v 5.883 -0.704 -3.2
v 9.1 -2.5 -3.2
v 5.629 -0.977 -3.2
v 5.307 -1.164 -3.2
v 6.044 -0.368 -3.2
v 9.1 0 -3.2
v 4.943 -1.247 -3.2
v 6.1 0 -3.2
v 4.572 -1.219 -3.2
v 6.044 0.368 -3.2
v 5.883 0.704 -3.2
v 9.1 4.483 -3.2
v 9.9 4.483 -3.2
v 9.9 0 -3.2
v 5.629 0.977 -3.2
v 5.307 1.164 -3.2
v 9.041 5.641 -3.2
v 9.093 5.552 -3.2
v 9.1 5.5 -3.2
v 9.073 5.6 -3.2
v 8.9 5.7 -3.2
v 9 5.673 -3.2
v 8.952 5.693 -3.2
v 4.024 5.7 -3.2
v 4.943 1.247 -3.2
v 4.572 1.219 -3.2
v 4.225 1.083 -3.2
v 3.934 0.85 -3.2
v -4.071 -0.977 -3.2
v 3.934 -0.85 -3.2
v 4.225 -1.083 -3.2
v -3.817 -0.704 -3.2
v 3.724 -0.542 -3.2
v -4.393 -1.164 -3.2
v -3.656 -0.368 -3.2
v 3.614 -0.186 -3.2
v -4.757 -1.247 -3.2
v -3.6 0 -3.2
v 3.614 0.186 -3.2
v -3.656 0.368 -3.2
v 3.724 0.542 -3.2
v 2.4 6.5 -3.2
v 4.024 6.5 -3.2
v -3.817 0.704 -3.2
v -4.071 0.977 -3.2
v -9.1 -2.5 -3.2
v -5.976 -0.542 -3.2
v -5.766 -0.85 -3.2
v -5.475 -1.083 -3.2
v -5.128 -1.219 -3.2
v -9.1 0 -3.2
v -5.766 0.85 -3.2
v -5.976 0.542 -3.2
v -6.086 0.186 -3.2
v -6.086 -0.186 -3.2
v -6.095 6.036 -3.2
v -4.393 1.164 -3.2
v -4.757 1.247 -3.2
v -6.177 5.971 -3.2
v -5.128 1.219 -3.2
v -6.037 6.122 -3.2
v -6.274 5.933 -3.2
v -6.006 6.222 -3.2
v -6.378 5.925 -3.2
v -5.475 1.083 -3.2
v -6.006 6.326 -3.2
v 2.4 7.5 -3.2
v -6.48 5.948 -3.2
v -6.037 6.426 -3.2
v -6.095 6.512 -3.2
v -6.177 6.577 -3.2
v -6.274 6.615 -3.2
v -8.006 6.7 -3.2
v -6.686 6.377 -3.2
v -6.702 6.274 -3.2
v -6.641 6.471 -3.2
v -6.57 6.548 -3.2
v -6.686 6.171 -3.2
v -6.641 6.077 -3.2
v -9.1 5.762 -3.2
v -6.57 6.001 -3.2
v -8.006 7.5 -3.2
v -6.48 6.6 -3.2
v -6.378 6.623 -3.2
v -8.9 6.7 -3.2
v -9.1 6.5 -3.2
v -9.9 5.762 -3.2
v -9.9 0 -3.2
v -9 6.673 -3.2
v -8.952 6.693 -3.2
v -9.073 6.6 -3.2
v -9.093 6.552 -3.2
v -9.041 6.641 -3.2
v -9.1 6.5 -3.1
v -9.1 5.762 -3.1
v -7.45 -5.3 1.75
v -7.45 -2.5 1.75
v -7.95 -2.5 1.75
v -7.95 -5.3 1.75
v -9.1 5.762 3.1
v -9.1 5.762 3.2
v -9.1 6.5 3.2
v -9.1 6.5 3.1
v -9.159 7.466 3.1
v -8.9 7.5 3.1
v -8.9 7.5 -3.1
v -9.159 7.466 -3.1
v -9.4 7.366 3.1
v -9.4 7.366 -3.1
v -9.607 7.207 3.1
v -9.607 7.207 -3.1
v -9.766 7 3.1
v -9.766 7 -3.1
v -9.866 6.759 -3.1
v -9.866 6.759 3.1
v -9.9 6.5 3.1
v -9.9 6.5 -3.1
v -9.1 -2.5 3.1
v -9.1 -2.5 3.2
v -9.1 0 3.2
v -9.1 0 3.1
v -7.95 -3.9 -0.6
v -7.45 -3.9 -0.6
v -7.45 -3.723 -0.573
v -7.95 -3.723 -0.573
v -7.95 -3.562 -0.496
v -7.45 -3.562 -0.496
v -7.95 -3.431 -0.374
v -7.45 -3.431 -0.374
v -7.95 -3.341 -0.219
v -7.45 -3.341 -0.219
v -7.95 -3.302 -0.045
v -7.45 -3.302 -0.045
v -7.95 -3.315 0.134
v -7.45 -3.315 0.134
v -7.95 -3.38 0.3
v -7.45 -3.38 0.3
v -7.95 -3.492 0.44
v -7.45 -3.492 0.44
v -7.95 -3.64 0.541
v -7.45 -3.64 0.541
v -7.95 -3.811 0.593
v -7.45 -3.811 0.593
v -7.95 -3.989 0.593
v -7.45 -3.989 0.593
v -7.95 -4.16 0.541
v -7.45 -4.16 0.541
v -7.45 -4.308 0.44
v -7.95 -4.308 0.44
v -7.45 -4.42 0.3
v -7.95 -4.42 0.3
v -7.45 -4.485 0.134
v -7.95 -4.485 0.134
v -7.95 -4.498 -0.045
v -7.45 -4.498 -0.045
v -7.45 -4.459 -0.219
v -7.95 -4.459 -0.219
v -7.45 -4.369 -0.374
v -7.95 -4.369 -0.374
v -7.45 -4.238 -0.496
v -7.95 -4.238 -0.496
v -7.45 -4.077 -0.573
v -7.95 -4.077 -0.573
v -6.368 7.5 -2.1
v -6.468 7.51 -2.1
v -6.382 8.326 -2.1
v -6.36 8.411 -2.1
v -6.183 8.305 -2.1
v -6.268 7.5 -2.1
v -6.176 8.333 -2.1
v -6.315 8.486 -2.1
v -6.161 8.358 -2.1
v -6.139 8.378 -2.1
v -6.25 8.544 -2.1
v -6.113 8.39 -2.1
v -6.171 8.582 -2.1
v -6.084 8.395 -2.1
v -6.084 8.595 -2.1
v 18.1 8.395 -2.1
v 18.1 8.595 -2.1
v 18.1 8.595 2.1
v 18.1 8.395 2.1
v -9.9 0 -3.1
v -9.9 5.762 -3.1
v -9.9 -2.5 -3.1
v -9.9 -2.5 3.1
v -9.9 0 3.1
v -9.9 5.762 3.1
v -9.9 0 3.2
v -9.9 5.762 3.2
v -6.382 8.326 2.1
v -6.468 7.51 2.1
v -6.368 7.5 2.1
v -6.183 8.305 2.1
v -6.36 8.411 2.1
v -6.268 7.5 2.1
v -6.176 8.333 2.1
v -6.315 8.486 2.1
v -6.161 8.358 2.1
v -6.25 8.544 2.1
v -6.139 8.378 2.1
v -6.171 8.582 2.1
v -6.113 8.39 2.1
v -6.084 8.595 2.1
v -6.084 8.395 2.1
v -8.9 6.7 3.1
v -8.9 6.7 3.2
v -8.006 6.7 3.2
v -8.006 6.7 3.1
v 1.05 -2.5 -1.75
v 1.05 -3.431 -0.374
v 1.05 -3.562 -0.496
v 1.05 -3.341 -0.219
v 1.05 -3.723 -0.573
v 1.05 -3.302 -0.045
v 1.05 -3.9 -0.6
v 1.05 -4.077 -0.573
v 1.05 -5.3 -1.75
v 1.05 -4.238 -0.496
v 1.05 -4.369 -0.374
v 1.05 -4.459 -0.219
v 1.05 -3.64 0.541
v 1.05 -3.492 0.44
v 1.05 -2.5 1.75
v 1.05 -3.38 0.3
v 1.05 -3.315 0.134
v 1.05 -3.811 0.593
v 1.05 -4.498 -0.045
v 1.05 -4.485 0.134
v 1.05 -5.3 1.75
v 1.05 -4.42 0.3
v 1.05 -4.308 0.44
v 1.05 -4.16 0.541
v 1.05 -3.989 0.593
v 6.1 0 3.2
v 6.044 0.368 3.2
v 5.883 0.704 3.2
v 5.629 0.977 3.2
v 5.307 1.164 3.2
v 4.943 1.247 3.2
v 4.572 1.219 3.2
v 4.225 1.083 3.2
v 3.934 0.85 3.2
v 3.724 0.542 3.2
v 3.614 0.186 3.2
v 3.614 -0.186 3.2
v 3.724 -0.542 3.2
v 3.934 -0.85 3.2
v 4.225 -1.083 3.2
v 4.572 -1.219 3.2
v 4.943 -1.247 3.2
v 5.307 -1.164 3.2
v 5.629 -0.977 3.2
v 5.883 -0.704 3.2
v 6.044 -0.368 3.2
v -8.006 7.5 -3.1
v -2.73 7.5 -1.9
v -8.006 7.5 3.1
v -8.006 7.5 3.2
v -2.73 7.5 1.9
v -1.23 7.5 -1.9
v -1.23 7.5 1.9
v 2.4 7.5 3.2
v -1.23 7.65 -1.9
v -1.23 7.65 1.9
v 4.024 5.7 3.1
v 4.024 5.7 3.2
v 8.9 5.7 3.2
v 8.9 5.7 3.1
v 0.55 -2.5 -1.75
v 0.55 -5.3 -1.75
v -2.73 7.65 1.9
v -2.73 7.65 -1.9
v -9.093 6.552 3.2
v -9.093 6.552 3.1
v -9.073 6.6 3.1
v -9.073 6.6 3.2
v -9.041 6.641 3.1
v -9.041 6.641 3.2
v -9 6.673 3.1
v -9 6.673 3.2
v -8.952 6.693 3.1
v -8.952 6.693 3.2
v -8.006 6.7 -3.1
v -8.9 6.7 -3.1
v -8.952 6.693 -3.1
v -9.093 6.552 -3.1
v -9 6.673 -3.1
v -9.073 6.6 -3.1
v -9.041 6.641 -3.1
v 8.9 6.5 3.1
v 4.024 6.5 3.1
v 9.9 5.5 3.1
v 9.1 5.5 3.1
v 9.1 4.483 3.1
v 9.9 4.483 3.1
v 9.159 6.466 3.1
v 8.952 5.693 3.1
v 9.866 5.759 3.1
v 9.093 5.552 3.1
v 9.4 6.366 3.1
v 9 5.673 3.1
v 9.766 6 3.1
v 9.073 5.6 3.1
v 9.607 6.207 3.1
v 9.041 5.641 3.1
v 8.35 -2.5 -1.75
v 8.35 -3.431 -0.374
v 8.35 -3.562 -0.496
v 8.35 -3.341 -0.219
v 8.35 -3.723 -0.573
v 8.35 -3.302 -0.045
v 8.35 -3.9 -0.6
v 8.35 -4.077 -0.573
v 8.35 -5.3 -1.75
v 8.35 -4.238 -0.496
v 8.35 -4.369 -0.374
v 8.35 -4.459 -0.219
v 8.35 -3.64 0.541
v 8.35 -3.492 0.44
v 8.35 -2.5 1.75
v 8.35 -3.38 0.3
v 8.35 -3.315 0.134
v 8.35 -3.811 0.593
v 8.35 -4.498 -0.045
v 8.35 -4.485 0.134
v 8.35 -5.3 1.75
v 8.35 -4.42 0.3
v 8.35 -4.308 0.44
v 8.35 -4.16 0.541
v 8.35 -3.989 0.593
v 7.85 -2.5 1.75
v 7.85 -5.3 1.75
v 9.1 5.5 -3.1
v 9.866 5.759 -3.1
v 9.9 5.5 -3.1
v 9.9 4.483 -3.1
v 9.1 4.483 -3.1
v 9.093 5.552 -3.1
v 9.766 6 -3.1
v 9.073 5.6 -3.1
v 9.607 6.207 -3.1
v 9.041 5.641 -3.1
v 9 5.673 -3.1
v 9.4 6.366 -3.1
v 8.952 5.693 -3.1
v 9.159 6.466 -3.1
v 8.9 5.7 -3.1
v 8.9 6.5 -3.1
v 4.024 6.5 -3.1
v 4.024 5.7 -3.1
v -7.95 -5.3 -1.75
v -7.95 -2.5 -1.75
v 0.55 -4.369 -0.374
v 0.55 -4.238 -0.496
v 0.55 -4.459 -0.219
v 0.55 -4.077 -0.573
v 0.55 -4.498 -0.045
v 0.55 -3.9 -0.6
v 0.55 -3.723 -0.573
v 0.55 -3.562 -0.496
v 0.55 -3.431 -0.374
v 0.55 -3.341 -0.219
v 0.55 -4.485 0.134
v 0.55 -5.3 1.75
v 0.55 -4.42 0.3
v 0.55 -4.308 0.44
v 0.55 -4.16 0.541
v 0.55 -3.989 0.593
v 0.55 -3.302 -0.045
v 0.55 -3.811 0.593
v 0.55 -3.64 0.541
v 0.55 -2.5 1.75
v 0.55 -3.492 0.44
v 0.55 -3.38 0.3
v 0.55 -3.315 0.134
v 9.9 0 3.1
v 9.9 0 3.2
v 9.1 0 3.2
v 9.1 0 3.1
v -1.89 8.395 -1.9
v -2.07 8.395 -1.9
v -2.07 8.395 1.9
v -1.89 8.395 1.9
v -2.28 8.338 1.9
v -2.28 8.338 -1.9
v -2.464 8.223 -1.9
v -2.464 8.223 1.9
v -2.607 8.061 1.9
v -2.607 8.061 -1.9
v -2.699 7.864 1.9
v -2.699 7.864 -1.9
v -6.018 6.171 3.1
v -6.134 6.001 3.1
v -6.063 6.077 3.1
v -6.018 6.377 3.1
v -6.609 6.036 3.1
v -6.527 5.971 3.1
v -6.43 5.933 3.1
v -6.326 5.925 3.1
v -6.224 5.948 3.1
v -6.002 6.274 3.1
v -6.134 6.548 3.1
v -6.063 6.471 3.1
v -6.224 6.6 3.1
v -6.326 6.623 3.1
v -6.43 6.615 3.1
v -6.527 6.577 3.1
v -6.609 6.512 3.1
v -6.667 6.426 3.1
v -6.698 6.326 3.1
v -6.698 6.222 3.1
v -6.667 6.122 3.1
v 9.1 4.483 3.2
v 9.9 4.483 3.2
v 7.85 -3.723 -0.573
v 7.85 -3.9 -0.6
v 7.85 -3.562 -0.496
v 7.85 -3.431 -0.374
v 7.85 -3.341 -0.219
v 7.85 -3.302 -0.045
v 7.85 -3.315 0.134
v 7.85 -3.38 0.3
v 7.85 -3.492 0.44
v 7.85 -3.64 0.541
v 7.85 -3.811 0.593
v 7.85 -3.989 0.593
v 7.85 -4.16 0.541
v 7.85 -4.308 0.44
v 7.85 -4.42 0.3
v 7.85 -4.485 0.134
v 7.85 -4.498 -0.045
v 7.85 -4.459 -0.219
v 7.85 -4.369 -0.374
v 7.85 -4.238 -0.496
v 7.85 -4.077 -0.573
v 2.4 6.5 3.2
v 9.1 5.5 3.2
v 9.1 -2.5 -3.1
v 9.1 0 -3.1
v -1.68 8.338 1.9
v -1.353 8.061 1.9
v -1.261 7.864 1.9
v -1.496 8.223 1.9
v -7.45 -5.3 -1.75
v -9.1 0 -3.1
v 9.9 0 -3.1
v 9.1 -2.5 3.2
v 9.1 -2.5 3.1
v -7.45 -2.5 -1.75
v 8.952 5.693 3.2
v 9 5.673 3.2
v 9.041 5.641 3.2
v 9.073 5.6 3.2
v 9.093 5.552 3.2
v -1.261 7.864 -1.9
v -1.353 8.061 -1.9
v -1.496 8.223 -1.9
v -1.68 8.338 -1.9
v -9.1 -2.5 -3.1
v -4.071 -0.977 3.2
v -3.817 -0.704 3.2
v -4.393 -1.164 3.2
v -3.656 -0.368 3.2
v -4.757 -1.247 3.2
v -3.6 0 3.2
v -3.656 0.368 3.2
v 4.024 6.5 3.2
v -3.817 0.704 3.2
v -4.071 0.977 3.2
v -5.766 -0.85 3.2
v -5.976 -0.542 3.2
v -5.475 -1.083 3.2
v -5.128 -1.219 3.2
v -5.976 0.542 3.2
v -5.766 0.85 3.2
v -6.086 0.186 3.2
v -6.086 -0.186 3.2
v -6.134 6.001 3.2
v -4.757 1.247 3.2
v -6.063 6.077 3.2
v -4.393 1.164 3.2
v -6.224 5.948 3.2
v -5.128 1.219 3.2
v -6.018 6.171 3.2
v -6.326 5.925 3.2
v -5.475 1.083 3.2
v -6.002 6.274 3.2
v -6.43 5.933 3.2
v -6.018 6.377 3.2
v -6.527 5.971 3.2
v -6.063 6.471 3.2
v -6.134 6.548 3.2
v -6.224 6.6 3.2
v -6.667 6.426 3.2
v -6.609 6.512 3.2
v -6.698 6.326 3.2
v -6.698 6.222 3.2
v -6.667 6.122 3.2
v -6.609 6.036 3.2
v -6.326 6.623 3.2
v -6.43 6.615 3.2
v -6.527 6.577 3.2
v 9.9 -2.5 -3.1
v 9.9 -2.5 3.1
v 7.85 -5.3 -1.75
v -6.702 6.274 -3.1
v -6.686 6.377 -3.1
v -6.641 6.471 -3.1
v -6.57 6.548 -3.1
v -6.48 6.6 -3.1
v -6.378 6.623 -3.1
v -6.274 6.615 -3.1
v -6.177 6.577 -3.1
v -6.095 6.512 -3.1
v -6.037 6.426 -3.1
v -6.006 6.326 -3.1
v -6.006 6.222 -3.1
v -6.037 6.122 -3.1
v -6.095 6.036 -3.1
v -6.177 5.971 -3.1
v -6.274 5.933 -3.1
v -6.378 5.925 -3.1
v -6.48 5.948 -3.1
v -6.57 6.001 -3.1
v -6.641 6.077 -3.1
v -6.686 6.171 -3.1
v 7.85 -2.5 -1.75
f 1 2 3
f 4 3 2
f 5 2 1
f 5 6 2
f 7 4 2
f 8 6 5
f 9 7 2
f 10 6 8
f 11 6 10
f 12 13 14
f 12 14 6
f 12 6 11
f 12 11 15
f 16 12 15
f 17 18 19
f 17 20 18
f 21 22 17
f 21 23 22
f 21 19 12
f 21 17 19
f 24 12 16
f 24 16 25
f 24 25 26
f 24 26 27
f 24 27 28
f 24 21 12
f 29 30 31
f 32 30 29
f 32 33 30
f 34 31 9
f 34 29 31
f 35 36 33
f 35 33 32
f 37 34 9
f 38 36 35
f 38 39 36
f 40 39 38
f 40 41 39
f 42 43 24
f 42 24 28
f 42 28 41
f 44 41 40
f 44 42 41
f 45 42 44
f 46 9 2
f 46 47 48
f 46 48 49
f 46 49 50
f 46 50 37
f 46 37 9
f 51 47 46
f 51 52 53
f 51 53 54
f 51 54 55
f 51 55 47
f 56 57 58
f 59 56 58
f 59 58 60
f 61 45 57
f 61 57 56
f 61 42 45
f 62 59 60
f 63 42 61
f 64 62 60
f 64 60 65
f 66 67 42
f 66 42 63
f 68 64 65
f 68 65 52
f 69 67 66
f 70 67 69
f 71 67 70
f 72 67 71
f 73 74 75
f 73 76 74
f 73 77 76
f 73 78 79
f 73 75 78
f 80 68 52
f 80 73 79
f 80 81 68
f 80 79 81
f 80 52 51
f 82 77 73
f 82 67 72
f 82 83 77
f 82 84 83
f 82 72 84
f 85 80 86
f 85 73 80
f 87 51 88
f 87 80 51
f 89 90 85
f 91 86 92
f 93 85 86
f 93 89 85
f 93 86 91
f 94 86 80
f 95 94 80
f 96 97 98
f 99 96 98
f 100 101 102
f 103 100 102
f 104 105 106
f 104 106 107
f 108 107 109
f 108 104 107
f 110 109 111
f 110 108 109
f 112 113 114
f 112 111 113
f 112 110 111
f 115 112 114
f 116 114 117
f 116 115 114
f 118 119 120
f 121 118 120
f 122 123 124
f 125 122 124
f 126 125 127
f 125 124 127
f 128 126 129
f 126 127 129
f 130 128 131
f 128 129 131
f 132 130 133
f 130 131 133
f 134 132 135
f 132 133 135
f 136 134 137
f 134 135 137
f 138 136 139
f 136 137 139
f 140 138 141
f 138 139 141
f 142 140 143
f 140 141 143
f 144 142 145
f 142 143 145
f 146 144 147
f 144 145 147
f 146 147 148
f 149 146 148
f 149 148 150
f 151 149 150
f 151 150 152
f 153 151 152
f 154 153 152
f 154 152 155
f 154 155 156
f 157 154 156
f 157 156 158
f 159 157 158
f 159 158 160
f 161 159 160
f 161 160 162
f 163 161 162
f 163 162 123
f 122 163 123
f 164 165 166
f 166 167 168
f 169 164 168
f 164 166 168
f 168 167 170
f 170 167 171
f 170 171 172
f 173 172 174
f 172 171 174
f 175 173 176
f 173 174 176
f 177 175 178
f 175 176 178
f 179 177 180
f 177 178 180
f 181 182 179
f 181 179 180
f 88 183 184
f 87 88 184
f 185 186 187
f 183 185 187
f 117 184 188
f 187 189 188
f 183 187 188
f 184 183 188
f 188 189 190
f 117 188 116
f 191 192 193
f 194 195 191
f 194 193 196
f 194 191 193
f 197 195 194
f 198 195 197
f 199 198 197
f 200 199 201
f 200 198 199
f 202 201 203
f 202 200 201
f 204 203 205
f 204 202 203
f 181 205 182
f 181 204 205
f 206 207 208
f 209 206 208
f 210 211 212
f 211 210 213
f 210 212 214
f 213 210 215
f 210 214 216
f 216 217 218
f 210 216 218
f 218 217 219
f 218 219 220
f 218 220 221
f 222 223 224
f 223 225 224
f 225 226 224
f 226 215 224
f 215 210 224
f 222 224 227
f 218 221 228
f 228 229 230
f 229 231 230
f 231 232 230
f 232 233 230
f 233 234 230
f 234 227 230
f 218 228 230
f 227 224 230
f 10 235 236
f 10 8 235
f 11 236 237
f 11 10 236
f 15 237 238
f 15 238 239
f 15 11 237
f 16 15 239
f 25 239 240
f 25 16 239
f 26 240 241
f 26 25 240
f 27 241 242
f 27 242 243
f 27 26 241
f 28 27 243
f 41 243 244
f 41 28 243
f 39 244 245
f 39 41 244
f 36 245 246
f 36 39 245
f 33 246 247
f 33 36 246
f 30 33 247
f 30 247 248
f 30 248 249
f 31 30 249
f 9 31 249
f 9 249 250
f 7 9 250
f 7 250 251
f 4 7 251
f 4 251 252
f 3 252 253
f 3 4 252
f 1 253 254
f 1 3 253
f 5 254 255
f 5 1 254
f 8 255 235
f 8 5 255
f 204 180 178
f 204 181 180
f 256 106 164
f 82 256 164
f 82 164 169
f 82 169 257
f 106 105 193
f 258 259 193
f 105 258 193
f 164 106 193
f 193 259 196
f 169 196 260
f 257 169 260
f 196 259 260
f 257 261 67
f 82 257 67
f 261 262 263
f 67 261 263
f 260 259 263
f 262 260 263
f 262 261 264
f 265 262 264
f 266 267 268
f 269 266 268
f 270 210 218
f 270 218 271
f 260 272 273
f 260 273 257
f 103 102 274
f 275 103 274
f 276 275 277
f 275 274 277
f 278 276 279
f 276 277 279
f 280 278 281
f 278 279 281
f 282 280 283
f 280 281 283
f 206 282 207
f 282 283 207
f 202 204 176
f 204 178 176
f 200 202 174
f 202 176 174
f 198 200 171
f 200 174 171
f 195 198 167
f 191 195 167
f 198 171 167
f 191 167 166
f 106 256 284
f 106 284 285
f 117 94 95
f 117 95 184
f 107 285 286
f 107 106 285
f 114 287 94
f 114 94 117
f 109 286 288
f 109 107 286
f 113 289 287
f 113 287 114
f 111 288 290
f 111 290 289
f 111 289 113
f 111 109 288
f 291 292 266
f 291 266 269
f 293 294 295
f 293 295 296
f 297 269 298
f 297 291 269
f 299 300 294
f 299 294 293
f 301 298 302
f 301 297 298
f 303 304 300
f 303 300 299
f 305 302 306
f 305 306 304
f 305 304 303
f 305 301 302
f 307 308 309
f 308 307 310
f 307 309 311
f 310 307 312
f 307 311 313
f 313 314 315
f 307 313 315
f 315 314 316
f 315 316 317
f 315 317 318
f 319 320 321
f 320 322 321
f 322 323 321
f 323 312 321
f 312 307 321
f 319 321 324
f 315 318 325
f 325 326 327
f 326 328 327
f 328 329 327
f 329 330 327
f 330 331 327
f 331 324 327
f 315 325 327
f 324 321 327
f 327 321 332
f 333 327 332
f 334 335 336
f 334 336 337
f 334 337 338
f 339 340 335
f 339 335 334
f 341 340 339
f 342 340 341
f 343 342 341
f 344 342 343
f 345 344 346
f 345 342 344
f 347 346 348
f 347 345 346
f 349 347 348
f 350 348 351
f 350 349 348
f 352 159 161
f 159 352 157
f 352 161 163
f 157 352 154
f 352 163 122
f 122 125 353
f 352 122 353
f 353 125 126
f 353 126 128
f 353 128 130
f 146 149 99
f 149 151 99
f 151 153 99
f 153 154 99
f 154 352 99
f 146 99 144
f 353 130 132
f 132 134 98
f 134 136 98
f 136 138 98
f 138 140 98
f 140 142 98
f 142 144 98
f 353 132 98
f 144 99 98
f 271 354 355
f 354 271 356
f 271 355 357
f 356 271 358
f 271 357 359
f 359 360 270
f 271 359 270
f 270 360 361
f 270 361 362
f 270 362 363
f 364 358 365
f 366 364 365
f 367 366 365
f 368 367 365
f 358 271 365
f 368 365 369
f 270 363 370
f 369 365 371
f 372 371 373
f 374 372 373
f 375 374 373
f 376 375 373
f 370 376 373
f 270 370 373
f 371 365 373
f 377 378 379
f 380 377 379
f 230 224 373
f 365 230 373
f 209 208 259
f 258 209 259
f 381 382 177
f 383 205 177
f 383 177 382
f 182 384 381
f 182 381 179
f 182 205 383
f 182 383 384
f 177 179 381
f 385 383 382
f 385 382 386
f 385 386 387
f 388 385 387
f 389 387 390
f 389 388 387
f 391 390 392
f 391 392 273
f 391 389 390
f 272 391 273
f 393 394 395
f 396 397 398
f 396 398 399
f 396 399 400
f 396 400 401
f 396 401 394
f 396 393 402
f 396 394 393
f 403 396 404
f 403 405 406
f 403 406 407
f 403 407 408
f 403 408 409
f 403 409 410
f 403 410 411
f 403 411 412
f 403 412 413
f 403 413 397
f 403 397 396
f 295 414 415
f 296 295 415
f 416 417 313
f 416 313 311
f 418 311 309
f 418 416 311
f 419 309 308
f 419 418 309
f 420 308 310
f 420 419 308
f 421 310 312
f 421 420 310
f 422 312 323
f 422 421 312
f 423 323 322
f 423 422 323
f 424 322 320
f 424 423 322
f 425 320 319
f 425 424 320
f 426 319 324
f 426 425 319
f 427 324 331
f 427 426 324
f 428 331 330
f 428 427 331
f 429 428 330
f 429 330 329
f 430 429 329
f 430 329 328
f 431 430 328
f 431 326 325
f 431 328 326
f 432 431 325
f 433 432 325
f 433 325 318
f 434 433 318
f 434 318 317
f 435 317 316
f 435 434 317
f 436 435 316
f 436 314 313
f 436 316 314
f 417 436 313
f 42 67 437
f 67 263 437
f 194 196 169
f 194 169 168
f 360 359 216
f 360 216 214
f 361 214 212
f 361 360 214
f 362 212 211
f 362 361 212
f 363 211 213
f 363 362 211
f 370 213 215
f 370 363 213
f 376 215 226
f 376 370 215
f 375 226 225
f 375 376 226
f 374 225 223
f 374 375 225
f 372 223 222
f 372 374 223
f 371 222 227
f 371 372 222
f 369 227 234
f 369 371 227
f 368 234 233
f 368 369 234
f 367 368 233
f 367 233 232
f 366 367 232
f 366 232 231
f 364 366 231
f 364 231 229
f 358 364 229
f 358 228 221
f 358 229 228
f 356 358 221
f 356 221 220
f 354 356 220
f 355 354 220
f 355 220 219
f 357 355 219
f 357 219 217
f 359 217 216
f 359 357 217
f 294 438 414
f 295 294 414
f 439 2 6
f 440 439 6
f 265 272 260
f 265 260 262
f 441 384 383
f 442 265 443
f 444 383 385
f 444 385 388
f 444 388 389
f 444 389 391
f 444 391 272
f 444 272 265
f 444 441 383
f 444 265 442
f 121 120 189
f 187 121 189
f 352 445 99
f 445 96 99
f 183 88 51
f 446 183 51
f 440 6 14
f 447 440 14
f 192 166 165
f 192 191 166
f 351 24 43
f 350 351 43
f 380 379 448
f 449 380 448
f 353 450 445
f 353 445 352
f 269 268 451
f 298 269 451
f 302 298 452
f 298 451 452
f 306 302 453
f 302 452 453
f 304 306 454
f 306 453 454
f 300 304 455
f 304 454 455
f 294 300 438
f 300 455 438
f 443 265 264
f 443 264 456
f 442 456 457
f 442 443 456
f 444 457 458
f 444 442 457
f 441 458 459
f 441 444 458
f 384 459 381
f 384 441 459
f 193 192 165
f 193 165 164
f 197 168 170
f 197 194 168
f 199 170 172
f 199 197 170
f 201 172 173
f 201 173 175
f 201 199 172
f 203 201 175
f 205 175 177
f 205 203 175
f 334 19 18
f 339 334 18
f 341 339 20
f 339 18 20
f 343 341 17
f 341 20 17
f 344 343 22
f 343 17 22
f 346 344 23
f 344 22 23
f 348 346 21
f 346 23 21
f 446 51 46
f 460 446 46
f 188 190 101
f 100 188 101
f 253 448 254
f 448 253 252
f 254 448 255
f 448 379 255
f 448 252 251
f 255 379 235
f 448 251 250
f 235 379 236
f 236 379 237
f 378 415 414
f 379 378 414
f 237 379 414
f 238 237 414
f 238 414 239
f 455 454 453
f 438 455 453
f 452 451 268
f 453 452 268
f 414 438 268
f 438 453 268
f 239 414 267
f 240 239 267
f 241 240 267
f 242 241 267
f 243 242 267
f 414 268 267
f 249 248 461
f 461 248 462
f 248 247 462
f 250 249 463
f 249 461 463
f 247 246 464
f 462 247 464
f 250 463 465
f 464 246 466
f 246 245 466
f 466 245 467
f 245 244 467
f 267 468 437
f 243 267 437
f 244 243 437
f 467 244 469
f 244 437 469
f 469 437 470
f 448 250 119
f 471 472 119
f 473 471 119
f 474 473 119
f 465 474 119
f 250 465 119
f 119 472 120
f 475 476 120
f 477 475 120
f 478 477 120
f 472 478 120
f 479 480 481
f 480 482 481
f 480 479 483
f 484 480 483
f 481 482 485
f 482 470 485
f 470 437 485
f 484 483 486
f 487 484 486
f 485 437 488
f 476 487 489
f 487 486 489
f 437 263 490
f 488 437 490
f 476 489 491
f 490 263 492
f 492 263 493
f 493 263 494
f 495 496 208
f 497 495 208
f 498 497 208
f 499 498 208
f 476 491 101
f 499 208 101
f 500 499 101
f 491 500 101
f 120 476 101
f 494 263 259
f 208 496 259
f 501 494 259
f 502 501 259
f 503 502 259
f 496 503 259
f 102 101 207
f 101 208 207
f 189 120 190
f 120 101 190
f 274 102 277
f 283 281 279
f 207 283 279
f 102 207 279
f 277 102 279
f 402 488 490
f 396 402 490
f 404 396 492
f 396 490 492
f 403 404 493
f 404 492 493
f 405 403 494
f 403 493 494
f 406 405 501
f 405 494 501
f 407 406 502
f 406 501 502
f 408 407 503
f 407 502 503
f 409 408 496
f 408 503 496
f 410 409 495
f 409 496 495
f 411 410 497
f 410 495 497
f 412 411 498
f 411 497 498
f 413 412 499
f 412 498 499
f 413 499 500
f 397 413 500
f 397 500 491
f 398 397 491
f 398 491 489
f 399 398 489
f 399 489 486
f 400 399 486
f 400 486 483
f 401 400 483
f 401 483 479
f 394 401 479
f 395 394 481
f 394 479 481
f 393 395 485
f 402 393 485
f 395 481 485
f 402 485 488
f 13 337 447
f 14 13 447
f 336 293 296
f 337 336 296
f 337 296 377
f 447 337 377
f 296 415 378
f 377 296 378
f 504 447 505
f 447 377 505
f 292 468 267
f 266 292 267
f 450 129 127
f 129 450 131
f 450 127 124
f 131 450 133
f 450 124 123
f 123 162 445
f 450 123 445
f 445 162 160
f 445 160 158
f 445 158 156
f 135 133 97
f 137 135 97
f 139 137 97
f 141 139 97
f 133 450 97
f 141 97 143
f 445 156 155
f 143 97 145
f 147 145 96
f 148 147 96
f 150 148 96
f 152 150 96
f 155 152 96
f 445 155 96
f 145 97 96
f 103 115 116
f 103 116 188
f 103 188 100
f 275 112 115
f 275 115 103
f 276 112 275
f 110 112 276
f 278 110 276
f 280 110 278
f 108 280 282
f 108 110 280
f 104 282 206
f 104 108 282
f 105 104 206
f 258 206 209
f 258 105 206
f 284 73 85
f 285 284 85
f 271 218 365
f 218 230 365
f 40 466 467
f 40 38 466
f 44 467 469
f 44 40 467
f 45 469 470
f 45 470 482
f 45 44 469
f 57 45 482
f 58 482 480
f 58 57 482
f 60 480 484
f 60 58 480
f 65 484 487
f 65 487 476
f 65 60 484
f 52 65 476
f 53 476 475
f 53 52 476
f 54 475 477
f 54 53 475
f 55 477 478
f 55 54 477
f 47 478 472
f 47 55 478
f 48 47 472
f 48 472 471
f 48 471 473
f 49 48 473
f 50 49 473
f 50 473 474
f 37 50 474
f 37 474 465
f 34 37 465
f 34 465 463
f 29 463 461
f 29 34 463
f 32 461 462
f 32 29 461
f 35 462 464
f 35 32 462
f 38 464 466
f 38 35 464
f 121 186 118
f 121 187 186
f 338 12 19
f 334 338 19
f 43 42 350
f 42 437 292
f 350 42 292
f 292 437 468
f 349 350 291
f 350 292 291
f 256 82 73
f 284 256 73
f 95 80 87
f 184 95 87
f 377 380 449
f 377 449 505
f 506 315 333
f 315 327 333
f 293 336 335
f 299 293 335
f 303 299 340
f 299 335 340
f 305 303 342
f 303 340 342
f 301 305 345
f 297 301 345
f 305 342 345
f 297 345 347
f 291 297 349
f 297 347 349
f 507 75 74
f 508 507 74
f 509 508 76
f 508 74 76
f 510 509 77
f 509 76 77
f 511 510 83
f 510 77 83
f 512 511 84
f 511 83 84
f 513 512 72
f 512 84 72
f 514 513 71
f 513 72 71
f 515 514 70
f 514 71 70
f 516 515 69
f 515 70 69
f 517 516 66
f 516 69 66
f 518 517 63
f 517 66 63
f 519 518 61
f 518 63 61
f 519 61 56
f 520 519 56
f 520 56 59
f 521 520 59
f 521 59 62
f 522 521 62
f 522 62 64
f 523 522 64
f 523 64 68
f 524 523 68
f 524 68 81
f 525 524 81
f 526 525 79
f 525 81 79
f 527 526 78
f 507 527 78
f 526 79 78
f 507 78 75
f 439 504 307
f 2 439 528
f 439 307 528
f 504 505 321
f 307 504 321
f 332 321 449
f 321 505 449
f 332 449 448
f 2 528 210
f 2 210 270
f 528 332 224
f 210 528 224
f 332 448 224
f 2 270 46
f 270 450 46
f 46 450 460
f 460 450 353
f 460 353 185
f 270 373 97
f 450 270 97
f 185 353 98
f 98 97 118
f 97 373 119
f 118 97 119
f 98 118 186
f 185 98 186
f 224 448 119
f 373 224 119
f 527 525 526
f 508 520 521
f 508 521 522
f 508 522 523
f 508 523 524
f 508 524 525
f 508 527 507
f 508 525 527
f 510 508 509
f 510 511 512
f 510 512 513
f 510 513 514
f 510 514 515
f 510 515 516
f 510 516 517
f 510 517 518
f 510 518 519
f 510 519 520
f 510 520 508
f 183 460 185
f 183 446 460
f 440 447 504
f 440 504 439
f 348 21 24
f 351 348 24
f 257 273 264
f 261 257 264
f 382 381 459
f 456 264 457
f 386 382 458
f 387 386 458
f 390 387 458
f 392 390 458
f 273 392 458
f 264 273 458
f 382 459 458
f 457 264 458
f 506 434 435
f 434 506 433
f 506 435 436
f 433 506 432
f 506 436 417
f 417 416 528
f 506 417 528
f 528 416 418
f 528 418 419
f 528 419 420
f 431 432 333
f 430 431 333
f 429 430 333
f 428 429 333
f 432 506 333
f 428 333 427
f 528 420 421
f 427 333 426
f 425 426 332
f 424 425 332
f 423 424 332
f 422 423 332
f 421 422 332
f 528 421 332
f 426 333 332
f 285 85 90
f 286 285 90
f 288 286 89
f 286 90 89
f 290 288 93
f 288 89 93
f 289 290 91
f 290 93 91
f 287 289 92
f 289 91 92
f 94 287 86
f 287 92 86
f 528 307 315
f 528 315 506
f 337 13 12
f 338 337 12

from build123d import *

# Parameters (mm, degrees)
SKETCH1_R                = 1.25
EXTRUDE1_DEPTH           = 3.2
EXTRUDE1_DEPTH_BACK      = 3.2
FILLET1_R                = 1
CUT_EXTRUDE1_DEPTH       = 0.1
CUT_EXTRUDE2_DEPTH       = 0.1
EXTRUDE3_DEPTH           = 1.75
EXTRUDE3_DEPTH_BACK      = 1.75
SKETCH6_R                = 0.6
CUT_EXTRUDE3_DEPTH       = 10.9
CUT_EXTRUDE3_DEPTH_BACK  = 10.9
SKETCH8_R                = 0.35
CUT_EXTRUDE4_DEPTH       = 0.1
SKETCH9_R                = 0.35
CUT_EXTRUDE5_DEPTH       = 0.1
EXTRUDE4_DEPTH           = 1.9
EXTRUDE4_DEPTH_BACK      = 1.9
EXTRUDE_THIN3_DEPTH      = 2.1
EXTRUDE_THIN3_DEPTH_BACK = 2.1
FILLET6_R                = 0.1
FILLET7_R                = 0.3


with BuildPart() as part:
    # Sketch1 → Extrude1 (new body, two sides)
    with BuildSketch(Plane.XY) as extrude1_sk:
        Polygon((-9.9, 7.5), (2.4, 7.5), (2.4, 6.5), (9.9, 6.5), (9.9, -2.5), (-9.9, -2.5), align=None)
        with Locations((-4.85, 0)):
            Circle(SKETCH1_R, mode=Mode.SUBTRACT)
        with Locations((4.85, 0)):
            Circle(SKETCH1_R, mode=Mode.SUBTRACT)
    extrude(amount=EXTRUDE1_DEPTH)
    extrude(extrude1_sk.sketch, amount=-EXTRUDE1_DEPTH_BACK)

    # Fillet1
    fillet1_edges = [part.edges().sort_by_distance(p)[0] for p in [
        (-9.9, 7.5, 0),
        (9.9, 6.5, 0),
    ]]
    fillet(fillet1_edges, radius=FILLET1_R)

    # Sketch2 → Cut-Extrude1 (cut)
    with BuildSketch(Plane.XY.offset(3.2)):
        with BuildLine():
            Line((8.9, 6.5), (4.024187691, 6.5))
            Line((4.024187691, 6.5), (4.024187691, 5.7))
            Line((4.024187691, 5.7), (8.9, 5.7))
            ThreePointArc((8.9, 5.7), (9.041421356, 5.641421356), (9.1, 5.5))
            Line((9.1, 5.5), (9.1, 4.482655552))
            Line((9.1, 4.482655552), (9.9, 4.482655552))
            Line((9.9, 4.482655552), (9.9, 5.5))
            ThreePointArc((9.9, 5.5), (9.607106781, 6.207106781), (8.9, 6.5))
        make_face()
        Polygon((9.9, -2.5), (9.9, 0), (9.1, 0), (9.1, -1.7), (9.1, -2.5), align=None)
        Polygon((-9.9, -2.5), (-9.1, -2.5), (-9.1, -1.7), (-9.1, 0), (-9.9, 0), align=None)
        with BuildLine():
            Line((-8.006418485, 7.5), (-8.9, 7.5))
            ThreePointArc((-8.9, 7.5), (-9.607106781, 7.207106781), (-9.9, 6.5))
            Line((-9.9, 6.5), (-9.9, 5.761874198))
            Line((-9.9, 5.761874198), (-9.1, 5.761874198))
            Line((-9.1, 5.761874198), (-9.1, 6.5))
            ThreePointArc((-9.1, 6.5), (-9.041421356, 6.641421356), (-8.9, 6.7))
            Line((-8.9, 6.7), (-8.006418485, 6.7))
            Line((-8.006418485, 6.7), (-8.006418485, 7.5))
        make_face()
    extrude(amount=-CUT_EXTRUDE1_DEPTH, mode=Mode.SUBTRACT)

    # Sketch3 → Cut-Extrude2 (cut)
    with BuildSketch(Plane(origin=(0, 0, -3.2), x_dir=(-1, 0, 0), z_dir=(0, 0, -1))):
        with BuildLine():
            Line((8.9, 7.5), (8.006418485, 7.5))
            Line((8.006418485, 7.5), (8.006418485, 6.7))
            Line((8.006418485, 6.7), (8.9, 6.7))
            ThreePointArc((8.9, 6.7), (9.041421356, 6.641421356), (9.1, 6.5))
            Line((9.1, 6.5), (9.1, 5.761874198))
            Line((9.1, 5.761874198), (9.9, 5.761874198))
            Line((9.9, 5.761874198), (9.9, 6.5))
            ThreePointArc((9.9, 6.5), (9.607106781, 7.207106781), (8.9, 7.5))
        make_face()
        Polygon((9.1, -1.7), (9.1, -2.5), (9.9, -2.5), (9.9, 0), (9.1, 0), align=None)
        Polygon((-9.9, 0), (-9.9, -2.5), (-9.1, -2.5), (-9.1, -1.7), (-9.1, 0), align=None)
        with BuildLine():
            Line((-4.024187691, 5.7), (-4.024187691, 6.5))
            Line((-4.024187691, 6.5), (-8.9, 6.5))
            ThreePointArc((-8.9, 6.5), (-9.607106781, 6.207106781), (-9.9, 5.5))
            Line((-9.9, 5.5), (-9.9, 4.482655552))
            Line((-9.9, 4.482655552), (-9.1, 4.482655552))
            Line((-9.1, 4.482655552), (-9.1, 5.5))
            ThreePointArc((-9.1, 5.5), (-9.041421356, 5.641421356), (-8.9, 5.7))
            Line((-8.9, 5.7), (-4.024187691, 5.7))
        make_face()
    extrude(amount=-CUT_EXTRUDE2_DEPTH, mode=Mode.SUBTRACT)

    # Sketch5 → Extrude3 (add, two sides)
    with BuildSketch(Plane.XY) as extrude3_sk:
        Polygon((-7.95, -2.5), (-7.7, -2.5), (-7.45, -2.5), (-7.45, -5.3), (-7.95, -5.3), align=None)
        Polygon((8.1, -2.5), (8.35, -2.5), (8.35, -5.3), (7.85, -5.3), (7.85, -2.5), align=None)
        Polygon((0.55, -2.5), (0.8, -2.5), (1.05, -2.5), (1.05, -5.3), (0.55, -5.3), align=None)
    extrude(amount=EXTRUDE3_DEPTH)
    extrude(extrude3_sk.sketch, amount=-EXTRUDE3_DEPTH_BACK)

    # Sketch6 → Cut-Extrude3 (cut, two sides)
    with BuildSketch(Plane(origin=(0, 0, 0), x_dir=(0, 0, -1), z_dir=(1, 0, 0))) as cut_extrude3_sk:
        with Locations((0, -3.9)):
            Circle(SKETCH6_R)
    extrude(amount=CUT_EXTRUDE3_DEPTH, mode=Mode.SUBTRACT)
    extrude(cut_extrude3_sk.sketch, amount=-CUT_EXTRUDE3_DEPTH_BACK, mode=Mode.SUBTRACT)

    # Sketch8 → Cut-Extrude4 (cut)
    with BuildSketch(Plane.XY.offset(3.2)):
        with Locations((-6.351950972, 6.27426345)):
            Circle(SKETCH8_R)
    extrude(amount=-CUT_EXTRUDE4_DEPTH, mode=Mode.SUBTRACT)

    # Sketch9 → Cut-Extrude5 (cut)
    with BuildSketch(Plane(origin=(0, 0, -3.2), x_dir=(-1, 0, 0), z_dir=(0, 0, -1))):
        with Locations((6.351950972, 6.27426345)):
            Circle(SKETCH9_R)
    extrude(amount=-CUT_EXTRUDE5_DEPTH, mode=Mode.SUBTRACT)

    # Sketch11 → Extrude4 (add, two sides)
    with BuildSketch(Plane.XY) as extrude4_sk:
        with BuildLine():
            Line((-2.73, 7.65), (-2.73, 6.9))
            Line((-2.73, 6.9), (-1.23, 6.9))
            Line((-1.23, 6.9), (-1.23, 7.65))
            ThreePointArc((-1.23, 7.65), (-1.98, 8.4), (-2.73, 7.65))
        make_face()
    extrude(amount=EXTRUDE4_DEPTH)
    extrude(extrude4_sk.sketch, amount=-EXTRUDE4_DEPTH_BACK)

    # Sketch12 → Extrude-Thin3 (add, two sides)
    with BuildSketch(Plane.XY) as extrude_thin3_sk:
        Polygon((-6.268968863, 7.489547154), (-6.173852185, 8.394521895), (18.1, 8.394521895), (18.1, 8.594521895), (-6.353932994, 8.594521895), (-6.467873242, 7.510452846), align=None)
    extrude(amount=EXTRUDE_THIN3_DEPTH)
    extrude(extrude_thin3_sk.sketch, amount=-EXTRUDE_THIN3_DEPTH_BACK)

    # Fillet6
    fillet6_edges = [part.edges().sort_by_distance(p)[0] for p in [
        (-6.173852185, 8.394521895, 0),
    ]]
    fillet(fillet6_edges, radius=FILLET6_R)

    # Fillet7
    fillet7_edges = [part.edges().sort_by_distance(p)[0] for p in [
        (-6.353932994, 8.594521895, 0),
    ]]
    fillet(fillet7_edges, radius=FILLET7_R)


solid = part.part
